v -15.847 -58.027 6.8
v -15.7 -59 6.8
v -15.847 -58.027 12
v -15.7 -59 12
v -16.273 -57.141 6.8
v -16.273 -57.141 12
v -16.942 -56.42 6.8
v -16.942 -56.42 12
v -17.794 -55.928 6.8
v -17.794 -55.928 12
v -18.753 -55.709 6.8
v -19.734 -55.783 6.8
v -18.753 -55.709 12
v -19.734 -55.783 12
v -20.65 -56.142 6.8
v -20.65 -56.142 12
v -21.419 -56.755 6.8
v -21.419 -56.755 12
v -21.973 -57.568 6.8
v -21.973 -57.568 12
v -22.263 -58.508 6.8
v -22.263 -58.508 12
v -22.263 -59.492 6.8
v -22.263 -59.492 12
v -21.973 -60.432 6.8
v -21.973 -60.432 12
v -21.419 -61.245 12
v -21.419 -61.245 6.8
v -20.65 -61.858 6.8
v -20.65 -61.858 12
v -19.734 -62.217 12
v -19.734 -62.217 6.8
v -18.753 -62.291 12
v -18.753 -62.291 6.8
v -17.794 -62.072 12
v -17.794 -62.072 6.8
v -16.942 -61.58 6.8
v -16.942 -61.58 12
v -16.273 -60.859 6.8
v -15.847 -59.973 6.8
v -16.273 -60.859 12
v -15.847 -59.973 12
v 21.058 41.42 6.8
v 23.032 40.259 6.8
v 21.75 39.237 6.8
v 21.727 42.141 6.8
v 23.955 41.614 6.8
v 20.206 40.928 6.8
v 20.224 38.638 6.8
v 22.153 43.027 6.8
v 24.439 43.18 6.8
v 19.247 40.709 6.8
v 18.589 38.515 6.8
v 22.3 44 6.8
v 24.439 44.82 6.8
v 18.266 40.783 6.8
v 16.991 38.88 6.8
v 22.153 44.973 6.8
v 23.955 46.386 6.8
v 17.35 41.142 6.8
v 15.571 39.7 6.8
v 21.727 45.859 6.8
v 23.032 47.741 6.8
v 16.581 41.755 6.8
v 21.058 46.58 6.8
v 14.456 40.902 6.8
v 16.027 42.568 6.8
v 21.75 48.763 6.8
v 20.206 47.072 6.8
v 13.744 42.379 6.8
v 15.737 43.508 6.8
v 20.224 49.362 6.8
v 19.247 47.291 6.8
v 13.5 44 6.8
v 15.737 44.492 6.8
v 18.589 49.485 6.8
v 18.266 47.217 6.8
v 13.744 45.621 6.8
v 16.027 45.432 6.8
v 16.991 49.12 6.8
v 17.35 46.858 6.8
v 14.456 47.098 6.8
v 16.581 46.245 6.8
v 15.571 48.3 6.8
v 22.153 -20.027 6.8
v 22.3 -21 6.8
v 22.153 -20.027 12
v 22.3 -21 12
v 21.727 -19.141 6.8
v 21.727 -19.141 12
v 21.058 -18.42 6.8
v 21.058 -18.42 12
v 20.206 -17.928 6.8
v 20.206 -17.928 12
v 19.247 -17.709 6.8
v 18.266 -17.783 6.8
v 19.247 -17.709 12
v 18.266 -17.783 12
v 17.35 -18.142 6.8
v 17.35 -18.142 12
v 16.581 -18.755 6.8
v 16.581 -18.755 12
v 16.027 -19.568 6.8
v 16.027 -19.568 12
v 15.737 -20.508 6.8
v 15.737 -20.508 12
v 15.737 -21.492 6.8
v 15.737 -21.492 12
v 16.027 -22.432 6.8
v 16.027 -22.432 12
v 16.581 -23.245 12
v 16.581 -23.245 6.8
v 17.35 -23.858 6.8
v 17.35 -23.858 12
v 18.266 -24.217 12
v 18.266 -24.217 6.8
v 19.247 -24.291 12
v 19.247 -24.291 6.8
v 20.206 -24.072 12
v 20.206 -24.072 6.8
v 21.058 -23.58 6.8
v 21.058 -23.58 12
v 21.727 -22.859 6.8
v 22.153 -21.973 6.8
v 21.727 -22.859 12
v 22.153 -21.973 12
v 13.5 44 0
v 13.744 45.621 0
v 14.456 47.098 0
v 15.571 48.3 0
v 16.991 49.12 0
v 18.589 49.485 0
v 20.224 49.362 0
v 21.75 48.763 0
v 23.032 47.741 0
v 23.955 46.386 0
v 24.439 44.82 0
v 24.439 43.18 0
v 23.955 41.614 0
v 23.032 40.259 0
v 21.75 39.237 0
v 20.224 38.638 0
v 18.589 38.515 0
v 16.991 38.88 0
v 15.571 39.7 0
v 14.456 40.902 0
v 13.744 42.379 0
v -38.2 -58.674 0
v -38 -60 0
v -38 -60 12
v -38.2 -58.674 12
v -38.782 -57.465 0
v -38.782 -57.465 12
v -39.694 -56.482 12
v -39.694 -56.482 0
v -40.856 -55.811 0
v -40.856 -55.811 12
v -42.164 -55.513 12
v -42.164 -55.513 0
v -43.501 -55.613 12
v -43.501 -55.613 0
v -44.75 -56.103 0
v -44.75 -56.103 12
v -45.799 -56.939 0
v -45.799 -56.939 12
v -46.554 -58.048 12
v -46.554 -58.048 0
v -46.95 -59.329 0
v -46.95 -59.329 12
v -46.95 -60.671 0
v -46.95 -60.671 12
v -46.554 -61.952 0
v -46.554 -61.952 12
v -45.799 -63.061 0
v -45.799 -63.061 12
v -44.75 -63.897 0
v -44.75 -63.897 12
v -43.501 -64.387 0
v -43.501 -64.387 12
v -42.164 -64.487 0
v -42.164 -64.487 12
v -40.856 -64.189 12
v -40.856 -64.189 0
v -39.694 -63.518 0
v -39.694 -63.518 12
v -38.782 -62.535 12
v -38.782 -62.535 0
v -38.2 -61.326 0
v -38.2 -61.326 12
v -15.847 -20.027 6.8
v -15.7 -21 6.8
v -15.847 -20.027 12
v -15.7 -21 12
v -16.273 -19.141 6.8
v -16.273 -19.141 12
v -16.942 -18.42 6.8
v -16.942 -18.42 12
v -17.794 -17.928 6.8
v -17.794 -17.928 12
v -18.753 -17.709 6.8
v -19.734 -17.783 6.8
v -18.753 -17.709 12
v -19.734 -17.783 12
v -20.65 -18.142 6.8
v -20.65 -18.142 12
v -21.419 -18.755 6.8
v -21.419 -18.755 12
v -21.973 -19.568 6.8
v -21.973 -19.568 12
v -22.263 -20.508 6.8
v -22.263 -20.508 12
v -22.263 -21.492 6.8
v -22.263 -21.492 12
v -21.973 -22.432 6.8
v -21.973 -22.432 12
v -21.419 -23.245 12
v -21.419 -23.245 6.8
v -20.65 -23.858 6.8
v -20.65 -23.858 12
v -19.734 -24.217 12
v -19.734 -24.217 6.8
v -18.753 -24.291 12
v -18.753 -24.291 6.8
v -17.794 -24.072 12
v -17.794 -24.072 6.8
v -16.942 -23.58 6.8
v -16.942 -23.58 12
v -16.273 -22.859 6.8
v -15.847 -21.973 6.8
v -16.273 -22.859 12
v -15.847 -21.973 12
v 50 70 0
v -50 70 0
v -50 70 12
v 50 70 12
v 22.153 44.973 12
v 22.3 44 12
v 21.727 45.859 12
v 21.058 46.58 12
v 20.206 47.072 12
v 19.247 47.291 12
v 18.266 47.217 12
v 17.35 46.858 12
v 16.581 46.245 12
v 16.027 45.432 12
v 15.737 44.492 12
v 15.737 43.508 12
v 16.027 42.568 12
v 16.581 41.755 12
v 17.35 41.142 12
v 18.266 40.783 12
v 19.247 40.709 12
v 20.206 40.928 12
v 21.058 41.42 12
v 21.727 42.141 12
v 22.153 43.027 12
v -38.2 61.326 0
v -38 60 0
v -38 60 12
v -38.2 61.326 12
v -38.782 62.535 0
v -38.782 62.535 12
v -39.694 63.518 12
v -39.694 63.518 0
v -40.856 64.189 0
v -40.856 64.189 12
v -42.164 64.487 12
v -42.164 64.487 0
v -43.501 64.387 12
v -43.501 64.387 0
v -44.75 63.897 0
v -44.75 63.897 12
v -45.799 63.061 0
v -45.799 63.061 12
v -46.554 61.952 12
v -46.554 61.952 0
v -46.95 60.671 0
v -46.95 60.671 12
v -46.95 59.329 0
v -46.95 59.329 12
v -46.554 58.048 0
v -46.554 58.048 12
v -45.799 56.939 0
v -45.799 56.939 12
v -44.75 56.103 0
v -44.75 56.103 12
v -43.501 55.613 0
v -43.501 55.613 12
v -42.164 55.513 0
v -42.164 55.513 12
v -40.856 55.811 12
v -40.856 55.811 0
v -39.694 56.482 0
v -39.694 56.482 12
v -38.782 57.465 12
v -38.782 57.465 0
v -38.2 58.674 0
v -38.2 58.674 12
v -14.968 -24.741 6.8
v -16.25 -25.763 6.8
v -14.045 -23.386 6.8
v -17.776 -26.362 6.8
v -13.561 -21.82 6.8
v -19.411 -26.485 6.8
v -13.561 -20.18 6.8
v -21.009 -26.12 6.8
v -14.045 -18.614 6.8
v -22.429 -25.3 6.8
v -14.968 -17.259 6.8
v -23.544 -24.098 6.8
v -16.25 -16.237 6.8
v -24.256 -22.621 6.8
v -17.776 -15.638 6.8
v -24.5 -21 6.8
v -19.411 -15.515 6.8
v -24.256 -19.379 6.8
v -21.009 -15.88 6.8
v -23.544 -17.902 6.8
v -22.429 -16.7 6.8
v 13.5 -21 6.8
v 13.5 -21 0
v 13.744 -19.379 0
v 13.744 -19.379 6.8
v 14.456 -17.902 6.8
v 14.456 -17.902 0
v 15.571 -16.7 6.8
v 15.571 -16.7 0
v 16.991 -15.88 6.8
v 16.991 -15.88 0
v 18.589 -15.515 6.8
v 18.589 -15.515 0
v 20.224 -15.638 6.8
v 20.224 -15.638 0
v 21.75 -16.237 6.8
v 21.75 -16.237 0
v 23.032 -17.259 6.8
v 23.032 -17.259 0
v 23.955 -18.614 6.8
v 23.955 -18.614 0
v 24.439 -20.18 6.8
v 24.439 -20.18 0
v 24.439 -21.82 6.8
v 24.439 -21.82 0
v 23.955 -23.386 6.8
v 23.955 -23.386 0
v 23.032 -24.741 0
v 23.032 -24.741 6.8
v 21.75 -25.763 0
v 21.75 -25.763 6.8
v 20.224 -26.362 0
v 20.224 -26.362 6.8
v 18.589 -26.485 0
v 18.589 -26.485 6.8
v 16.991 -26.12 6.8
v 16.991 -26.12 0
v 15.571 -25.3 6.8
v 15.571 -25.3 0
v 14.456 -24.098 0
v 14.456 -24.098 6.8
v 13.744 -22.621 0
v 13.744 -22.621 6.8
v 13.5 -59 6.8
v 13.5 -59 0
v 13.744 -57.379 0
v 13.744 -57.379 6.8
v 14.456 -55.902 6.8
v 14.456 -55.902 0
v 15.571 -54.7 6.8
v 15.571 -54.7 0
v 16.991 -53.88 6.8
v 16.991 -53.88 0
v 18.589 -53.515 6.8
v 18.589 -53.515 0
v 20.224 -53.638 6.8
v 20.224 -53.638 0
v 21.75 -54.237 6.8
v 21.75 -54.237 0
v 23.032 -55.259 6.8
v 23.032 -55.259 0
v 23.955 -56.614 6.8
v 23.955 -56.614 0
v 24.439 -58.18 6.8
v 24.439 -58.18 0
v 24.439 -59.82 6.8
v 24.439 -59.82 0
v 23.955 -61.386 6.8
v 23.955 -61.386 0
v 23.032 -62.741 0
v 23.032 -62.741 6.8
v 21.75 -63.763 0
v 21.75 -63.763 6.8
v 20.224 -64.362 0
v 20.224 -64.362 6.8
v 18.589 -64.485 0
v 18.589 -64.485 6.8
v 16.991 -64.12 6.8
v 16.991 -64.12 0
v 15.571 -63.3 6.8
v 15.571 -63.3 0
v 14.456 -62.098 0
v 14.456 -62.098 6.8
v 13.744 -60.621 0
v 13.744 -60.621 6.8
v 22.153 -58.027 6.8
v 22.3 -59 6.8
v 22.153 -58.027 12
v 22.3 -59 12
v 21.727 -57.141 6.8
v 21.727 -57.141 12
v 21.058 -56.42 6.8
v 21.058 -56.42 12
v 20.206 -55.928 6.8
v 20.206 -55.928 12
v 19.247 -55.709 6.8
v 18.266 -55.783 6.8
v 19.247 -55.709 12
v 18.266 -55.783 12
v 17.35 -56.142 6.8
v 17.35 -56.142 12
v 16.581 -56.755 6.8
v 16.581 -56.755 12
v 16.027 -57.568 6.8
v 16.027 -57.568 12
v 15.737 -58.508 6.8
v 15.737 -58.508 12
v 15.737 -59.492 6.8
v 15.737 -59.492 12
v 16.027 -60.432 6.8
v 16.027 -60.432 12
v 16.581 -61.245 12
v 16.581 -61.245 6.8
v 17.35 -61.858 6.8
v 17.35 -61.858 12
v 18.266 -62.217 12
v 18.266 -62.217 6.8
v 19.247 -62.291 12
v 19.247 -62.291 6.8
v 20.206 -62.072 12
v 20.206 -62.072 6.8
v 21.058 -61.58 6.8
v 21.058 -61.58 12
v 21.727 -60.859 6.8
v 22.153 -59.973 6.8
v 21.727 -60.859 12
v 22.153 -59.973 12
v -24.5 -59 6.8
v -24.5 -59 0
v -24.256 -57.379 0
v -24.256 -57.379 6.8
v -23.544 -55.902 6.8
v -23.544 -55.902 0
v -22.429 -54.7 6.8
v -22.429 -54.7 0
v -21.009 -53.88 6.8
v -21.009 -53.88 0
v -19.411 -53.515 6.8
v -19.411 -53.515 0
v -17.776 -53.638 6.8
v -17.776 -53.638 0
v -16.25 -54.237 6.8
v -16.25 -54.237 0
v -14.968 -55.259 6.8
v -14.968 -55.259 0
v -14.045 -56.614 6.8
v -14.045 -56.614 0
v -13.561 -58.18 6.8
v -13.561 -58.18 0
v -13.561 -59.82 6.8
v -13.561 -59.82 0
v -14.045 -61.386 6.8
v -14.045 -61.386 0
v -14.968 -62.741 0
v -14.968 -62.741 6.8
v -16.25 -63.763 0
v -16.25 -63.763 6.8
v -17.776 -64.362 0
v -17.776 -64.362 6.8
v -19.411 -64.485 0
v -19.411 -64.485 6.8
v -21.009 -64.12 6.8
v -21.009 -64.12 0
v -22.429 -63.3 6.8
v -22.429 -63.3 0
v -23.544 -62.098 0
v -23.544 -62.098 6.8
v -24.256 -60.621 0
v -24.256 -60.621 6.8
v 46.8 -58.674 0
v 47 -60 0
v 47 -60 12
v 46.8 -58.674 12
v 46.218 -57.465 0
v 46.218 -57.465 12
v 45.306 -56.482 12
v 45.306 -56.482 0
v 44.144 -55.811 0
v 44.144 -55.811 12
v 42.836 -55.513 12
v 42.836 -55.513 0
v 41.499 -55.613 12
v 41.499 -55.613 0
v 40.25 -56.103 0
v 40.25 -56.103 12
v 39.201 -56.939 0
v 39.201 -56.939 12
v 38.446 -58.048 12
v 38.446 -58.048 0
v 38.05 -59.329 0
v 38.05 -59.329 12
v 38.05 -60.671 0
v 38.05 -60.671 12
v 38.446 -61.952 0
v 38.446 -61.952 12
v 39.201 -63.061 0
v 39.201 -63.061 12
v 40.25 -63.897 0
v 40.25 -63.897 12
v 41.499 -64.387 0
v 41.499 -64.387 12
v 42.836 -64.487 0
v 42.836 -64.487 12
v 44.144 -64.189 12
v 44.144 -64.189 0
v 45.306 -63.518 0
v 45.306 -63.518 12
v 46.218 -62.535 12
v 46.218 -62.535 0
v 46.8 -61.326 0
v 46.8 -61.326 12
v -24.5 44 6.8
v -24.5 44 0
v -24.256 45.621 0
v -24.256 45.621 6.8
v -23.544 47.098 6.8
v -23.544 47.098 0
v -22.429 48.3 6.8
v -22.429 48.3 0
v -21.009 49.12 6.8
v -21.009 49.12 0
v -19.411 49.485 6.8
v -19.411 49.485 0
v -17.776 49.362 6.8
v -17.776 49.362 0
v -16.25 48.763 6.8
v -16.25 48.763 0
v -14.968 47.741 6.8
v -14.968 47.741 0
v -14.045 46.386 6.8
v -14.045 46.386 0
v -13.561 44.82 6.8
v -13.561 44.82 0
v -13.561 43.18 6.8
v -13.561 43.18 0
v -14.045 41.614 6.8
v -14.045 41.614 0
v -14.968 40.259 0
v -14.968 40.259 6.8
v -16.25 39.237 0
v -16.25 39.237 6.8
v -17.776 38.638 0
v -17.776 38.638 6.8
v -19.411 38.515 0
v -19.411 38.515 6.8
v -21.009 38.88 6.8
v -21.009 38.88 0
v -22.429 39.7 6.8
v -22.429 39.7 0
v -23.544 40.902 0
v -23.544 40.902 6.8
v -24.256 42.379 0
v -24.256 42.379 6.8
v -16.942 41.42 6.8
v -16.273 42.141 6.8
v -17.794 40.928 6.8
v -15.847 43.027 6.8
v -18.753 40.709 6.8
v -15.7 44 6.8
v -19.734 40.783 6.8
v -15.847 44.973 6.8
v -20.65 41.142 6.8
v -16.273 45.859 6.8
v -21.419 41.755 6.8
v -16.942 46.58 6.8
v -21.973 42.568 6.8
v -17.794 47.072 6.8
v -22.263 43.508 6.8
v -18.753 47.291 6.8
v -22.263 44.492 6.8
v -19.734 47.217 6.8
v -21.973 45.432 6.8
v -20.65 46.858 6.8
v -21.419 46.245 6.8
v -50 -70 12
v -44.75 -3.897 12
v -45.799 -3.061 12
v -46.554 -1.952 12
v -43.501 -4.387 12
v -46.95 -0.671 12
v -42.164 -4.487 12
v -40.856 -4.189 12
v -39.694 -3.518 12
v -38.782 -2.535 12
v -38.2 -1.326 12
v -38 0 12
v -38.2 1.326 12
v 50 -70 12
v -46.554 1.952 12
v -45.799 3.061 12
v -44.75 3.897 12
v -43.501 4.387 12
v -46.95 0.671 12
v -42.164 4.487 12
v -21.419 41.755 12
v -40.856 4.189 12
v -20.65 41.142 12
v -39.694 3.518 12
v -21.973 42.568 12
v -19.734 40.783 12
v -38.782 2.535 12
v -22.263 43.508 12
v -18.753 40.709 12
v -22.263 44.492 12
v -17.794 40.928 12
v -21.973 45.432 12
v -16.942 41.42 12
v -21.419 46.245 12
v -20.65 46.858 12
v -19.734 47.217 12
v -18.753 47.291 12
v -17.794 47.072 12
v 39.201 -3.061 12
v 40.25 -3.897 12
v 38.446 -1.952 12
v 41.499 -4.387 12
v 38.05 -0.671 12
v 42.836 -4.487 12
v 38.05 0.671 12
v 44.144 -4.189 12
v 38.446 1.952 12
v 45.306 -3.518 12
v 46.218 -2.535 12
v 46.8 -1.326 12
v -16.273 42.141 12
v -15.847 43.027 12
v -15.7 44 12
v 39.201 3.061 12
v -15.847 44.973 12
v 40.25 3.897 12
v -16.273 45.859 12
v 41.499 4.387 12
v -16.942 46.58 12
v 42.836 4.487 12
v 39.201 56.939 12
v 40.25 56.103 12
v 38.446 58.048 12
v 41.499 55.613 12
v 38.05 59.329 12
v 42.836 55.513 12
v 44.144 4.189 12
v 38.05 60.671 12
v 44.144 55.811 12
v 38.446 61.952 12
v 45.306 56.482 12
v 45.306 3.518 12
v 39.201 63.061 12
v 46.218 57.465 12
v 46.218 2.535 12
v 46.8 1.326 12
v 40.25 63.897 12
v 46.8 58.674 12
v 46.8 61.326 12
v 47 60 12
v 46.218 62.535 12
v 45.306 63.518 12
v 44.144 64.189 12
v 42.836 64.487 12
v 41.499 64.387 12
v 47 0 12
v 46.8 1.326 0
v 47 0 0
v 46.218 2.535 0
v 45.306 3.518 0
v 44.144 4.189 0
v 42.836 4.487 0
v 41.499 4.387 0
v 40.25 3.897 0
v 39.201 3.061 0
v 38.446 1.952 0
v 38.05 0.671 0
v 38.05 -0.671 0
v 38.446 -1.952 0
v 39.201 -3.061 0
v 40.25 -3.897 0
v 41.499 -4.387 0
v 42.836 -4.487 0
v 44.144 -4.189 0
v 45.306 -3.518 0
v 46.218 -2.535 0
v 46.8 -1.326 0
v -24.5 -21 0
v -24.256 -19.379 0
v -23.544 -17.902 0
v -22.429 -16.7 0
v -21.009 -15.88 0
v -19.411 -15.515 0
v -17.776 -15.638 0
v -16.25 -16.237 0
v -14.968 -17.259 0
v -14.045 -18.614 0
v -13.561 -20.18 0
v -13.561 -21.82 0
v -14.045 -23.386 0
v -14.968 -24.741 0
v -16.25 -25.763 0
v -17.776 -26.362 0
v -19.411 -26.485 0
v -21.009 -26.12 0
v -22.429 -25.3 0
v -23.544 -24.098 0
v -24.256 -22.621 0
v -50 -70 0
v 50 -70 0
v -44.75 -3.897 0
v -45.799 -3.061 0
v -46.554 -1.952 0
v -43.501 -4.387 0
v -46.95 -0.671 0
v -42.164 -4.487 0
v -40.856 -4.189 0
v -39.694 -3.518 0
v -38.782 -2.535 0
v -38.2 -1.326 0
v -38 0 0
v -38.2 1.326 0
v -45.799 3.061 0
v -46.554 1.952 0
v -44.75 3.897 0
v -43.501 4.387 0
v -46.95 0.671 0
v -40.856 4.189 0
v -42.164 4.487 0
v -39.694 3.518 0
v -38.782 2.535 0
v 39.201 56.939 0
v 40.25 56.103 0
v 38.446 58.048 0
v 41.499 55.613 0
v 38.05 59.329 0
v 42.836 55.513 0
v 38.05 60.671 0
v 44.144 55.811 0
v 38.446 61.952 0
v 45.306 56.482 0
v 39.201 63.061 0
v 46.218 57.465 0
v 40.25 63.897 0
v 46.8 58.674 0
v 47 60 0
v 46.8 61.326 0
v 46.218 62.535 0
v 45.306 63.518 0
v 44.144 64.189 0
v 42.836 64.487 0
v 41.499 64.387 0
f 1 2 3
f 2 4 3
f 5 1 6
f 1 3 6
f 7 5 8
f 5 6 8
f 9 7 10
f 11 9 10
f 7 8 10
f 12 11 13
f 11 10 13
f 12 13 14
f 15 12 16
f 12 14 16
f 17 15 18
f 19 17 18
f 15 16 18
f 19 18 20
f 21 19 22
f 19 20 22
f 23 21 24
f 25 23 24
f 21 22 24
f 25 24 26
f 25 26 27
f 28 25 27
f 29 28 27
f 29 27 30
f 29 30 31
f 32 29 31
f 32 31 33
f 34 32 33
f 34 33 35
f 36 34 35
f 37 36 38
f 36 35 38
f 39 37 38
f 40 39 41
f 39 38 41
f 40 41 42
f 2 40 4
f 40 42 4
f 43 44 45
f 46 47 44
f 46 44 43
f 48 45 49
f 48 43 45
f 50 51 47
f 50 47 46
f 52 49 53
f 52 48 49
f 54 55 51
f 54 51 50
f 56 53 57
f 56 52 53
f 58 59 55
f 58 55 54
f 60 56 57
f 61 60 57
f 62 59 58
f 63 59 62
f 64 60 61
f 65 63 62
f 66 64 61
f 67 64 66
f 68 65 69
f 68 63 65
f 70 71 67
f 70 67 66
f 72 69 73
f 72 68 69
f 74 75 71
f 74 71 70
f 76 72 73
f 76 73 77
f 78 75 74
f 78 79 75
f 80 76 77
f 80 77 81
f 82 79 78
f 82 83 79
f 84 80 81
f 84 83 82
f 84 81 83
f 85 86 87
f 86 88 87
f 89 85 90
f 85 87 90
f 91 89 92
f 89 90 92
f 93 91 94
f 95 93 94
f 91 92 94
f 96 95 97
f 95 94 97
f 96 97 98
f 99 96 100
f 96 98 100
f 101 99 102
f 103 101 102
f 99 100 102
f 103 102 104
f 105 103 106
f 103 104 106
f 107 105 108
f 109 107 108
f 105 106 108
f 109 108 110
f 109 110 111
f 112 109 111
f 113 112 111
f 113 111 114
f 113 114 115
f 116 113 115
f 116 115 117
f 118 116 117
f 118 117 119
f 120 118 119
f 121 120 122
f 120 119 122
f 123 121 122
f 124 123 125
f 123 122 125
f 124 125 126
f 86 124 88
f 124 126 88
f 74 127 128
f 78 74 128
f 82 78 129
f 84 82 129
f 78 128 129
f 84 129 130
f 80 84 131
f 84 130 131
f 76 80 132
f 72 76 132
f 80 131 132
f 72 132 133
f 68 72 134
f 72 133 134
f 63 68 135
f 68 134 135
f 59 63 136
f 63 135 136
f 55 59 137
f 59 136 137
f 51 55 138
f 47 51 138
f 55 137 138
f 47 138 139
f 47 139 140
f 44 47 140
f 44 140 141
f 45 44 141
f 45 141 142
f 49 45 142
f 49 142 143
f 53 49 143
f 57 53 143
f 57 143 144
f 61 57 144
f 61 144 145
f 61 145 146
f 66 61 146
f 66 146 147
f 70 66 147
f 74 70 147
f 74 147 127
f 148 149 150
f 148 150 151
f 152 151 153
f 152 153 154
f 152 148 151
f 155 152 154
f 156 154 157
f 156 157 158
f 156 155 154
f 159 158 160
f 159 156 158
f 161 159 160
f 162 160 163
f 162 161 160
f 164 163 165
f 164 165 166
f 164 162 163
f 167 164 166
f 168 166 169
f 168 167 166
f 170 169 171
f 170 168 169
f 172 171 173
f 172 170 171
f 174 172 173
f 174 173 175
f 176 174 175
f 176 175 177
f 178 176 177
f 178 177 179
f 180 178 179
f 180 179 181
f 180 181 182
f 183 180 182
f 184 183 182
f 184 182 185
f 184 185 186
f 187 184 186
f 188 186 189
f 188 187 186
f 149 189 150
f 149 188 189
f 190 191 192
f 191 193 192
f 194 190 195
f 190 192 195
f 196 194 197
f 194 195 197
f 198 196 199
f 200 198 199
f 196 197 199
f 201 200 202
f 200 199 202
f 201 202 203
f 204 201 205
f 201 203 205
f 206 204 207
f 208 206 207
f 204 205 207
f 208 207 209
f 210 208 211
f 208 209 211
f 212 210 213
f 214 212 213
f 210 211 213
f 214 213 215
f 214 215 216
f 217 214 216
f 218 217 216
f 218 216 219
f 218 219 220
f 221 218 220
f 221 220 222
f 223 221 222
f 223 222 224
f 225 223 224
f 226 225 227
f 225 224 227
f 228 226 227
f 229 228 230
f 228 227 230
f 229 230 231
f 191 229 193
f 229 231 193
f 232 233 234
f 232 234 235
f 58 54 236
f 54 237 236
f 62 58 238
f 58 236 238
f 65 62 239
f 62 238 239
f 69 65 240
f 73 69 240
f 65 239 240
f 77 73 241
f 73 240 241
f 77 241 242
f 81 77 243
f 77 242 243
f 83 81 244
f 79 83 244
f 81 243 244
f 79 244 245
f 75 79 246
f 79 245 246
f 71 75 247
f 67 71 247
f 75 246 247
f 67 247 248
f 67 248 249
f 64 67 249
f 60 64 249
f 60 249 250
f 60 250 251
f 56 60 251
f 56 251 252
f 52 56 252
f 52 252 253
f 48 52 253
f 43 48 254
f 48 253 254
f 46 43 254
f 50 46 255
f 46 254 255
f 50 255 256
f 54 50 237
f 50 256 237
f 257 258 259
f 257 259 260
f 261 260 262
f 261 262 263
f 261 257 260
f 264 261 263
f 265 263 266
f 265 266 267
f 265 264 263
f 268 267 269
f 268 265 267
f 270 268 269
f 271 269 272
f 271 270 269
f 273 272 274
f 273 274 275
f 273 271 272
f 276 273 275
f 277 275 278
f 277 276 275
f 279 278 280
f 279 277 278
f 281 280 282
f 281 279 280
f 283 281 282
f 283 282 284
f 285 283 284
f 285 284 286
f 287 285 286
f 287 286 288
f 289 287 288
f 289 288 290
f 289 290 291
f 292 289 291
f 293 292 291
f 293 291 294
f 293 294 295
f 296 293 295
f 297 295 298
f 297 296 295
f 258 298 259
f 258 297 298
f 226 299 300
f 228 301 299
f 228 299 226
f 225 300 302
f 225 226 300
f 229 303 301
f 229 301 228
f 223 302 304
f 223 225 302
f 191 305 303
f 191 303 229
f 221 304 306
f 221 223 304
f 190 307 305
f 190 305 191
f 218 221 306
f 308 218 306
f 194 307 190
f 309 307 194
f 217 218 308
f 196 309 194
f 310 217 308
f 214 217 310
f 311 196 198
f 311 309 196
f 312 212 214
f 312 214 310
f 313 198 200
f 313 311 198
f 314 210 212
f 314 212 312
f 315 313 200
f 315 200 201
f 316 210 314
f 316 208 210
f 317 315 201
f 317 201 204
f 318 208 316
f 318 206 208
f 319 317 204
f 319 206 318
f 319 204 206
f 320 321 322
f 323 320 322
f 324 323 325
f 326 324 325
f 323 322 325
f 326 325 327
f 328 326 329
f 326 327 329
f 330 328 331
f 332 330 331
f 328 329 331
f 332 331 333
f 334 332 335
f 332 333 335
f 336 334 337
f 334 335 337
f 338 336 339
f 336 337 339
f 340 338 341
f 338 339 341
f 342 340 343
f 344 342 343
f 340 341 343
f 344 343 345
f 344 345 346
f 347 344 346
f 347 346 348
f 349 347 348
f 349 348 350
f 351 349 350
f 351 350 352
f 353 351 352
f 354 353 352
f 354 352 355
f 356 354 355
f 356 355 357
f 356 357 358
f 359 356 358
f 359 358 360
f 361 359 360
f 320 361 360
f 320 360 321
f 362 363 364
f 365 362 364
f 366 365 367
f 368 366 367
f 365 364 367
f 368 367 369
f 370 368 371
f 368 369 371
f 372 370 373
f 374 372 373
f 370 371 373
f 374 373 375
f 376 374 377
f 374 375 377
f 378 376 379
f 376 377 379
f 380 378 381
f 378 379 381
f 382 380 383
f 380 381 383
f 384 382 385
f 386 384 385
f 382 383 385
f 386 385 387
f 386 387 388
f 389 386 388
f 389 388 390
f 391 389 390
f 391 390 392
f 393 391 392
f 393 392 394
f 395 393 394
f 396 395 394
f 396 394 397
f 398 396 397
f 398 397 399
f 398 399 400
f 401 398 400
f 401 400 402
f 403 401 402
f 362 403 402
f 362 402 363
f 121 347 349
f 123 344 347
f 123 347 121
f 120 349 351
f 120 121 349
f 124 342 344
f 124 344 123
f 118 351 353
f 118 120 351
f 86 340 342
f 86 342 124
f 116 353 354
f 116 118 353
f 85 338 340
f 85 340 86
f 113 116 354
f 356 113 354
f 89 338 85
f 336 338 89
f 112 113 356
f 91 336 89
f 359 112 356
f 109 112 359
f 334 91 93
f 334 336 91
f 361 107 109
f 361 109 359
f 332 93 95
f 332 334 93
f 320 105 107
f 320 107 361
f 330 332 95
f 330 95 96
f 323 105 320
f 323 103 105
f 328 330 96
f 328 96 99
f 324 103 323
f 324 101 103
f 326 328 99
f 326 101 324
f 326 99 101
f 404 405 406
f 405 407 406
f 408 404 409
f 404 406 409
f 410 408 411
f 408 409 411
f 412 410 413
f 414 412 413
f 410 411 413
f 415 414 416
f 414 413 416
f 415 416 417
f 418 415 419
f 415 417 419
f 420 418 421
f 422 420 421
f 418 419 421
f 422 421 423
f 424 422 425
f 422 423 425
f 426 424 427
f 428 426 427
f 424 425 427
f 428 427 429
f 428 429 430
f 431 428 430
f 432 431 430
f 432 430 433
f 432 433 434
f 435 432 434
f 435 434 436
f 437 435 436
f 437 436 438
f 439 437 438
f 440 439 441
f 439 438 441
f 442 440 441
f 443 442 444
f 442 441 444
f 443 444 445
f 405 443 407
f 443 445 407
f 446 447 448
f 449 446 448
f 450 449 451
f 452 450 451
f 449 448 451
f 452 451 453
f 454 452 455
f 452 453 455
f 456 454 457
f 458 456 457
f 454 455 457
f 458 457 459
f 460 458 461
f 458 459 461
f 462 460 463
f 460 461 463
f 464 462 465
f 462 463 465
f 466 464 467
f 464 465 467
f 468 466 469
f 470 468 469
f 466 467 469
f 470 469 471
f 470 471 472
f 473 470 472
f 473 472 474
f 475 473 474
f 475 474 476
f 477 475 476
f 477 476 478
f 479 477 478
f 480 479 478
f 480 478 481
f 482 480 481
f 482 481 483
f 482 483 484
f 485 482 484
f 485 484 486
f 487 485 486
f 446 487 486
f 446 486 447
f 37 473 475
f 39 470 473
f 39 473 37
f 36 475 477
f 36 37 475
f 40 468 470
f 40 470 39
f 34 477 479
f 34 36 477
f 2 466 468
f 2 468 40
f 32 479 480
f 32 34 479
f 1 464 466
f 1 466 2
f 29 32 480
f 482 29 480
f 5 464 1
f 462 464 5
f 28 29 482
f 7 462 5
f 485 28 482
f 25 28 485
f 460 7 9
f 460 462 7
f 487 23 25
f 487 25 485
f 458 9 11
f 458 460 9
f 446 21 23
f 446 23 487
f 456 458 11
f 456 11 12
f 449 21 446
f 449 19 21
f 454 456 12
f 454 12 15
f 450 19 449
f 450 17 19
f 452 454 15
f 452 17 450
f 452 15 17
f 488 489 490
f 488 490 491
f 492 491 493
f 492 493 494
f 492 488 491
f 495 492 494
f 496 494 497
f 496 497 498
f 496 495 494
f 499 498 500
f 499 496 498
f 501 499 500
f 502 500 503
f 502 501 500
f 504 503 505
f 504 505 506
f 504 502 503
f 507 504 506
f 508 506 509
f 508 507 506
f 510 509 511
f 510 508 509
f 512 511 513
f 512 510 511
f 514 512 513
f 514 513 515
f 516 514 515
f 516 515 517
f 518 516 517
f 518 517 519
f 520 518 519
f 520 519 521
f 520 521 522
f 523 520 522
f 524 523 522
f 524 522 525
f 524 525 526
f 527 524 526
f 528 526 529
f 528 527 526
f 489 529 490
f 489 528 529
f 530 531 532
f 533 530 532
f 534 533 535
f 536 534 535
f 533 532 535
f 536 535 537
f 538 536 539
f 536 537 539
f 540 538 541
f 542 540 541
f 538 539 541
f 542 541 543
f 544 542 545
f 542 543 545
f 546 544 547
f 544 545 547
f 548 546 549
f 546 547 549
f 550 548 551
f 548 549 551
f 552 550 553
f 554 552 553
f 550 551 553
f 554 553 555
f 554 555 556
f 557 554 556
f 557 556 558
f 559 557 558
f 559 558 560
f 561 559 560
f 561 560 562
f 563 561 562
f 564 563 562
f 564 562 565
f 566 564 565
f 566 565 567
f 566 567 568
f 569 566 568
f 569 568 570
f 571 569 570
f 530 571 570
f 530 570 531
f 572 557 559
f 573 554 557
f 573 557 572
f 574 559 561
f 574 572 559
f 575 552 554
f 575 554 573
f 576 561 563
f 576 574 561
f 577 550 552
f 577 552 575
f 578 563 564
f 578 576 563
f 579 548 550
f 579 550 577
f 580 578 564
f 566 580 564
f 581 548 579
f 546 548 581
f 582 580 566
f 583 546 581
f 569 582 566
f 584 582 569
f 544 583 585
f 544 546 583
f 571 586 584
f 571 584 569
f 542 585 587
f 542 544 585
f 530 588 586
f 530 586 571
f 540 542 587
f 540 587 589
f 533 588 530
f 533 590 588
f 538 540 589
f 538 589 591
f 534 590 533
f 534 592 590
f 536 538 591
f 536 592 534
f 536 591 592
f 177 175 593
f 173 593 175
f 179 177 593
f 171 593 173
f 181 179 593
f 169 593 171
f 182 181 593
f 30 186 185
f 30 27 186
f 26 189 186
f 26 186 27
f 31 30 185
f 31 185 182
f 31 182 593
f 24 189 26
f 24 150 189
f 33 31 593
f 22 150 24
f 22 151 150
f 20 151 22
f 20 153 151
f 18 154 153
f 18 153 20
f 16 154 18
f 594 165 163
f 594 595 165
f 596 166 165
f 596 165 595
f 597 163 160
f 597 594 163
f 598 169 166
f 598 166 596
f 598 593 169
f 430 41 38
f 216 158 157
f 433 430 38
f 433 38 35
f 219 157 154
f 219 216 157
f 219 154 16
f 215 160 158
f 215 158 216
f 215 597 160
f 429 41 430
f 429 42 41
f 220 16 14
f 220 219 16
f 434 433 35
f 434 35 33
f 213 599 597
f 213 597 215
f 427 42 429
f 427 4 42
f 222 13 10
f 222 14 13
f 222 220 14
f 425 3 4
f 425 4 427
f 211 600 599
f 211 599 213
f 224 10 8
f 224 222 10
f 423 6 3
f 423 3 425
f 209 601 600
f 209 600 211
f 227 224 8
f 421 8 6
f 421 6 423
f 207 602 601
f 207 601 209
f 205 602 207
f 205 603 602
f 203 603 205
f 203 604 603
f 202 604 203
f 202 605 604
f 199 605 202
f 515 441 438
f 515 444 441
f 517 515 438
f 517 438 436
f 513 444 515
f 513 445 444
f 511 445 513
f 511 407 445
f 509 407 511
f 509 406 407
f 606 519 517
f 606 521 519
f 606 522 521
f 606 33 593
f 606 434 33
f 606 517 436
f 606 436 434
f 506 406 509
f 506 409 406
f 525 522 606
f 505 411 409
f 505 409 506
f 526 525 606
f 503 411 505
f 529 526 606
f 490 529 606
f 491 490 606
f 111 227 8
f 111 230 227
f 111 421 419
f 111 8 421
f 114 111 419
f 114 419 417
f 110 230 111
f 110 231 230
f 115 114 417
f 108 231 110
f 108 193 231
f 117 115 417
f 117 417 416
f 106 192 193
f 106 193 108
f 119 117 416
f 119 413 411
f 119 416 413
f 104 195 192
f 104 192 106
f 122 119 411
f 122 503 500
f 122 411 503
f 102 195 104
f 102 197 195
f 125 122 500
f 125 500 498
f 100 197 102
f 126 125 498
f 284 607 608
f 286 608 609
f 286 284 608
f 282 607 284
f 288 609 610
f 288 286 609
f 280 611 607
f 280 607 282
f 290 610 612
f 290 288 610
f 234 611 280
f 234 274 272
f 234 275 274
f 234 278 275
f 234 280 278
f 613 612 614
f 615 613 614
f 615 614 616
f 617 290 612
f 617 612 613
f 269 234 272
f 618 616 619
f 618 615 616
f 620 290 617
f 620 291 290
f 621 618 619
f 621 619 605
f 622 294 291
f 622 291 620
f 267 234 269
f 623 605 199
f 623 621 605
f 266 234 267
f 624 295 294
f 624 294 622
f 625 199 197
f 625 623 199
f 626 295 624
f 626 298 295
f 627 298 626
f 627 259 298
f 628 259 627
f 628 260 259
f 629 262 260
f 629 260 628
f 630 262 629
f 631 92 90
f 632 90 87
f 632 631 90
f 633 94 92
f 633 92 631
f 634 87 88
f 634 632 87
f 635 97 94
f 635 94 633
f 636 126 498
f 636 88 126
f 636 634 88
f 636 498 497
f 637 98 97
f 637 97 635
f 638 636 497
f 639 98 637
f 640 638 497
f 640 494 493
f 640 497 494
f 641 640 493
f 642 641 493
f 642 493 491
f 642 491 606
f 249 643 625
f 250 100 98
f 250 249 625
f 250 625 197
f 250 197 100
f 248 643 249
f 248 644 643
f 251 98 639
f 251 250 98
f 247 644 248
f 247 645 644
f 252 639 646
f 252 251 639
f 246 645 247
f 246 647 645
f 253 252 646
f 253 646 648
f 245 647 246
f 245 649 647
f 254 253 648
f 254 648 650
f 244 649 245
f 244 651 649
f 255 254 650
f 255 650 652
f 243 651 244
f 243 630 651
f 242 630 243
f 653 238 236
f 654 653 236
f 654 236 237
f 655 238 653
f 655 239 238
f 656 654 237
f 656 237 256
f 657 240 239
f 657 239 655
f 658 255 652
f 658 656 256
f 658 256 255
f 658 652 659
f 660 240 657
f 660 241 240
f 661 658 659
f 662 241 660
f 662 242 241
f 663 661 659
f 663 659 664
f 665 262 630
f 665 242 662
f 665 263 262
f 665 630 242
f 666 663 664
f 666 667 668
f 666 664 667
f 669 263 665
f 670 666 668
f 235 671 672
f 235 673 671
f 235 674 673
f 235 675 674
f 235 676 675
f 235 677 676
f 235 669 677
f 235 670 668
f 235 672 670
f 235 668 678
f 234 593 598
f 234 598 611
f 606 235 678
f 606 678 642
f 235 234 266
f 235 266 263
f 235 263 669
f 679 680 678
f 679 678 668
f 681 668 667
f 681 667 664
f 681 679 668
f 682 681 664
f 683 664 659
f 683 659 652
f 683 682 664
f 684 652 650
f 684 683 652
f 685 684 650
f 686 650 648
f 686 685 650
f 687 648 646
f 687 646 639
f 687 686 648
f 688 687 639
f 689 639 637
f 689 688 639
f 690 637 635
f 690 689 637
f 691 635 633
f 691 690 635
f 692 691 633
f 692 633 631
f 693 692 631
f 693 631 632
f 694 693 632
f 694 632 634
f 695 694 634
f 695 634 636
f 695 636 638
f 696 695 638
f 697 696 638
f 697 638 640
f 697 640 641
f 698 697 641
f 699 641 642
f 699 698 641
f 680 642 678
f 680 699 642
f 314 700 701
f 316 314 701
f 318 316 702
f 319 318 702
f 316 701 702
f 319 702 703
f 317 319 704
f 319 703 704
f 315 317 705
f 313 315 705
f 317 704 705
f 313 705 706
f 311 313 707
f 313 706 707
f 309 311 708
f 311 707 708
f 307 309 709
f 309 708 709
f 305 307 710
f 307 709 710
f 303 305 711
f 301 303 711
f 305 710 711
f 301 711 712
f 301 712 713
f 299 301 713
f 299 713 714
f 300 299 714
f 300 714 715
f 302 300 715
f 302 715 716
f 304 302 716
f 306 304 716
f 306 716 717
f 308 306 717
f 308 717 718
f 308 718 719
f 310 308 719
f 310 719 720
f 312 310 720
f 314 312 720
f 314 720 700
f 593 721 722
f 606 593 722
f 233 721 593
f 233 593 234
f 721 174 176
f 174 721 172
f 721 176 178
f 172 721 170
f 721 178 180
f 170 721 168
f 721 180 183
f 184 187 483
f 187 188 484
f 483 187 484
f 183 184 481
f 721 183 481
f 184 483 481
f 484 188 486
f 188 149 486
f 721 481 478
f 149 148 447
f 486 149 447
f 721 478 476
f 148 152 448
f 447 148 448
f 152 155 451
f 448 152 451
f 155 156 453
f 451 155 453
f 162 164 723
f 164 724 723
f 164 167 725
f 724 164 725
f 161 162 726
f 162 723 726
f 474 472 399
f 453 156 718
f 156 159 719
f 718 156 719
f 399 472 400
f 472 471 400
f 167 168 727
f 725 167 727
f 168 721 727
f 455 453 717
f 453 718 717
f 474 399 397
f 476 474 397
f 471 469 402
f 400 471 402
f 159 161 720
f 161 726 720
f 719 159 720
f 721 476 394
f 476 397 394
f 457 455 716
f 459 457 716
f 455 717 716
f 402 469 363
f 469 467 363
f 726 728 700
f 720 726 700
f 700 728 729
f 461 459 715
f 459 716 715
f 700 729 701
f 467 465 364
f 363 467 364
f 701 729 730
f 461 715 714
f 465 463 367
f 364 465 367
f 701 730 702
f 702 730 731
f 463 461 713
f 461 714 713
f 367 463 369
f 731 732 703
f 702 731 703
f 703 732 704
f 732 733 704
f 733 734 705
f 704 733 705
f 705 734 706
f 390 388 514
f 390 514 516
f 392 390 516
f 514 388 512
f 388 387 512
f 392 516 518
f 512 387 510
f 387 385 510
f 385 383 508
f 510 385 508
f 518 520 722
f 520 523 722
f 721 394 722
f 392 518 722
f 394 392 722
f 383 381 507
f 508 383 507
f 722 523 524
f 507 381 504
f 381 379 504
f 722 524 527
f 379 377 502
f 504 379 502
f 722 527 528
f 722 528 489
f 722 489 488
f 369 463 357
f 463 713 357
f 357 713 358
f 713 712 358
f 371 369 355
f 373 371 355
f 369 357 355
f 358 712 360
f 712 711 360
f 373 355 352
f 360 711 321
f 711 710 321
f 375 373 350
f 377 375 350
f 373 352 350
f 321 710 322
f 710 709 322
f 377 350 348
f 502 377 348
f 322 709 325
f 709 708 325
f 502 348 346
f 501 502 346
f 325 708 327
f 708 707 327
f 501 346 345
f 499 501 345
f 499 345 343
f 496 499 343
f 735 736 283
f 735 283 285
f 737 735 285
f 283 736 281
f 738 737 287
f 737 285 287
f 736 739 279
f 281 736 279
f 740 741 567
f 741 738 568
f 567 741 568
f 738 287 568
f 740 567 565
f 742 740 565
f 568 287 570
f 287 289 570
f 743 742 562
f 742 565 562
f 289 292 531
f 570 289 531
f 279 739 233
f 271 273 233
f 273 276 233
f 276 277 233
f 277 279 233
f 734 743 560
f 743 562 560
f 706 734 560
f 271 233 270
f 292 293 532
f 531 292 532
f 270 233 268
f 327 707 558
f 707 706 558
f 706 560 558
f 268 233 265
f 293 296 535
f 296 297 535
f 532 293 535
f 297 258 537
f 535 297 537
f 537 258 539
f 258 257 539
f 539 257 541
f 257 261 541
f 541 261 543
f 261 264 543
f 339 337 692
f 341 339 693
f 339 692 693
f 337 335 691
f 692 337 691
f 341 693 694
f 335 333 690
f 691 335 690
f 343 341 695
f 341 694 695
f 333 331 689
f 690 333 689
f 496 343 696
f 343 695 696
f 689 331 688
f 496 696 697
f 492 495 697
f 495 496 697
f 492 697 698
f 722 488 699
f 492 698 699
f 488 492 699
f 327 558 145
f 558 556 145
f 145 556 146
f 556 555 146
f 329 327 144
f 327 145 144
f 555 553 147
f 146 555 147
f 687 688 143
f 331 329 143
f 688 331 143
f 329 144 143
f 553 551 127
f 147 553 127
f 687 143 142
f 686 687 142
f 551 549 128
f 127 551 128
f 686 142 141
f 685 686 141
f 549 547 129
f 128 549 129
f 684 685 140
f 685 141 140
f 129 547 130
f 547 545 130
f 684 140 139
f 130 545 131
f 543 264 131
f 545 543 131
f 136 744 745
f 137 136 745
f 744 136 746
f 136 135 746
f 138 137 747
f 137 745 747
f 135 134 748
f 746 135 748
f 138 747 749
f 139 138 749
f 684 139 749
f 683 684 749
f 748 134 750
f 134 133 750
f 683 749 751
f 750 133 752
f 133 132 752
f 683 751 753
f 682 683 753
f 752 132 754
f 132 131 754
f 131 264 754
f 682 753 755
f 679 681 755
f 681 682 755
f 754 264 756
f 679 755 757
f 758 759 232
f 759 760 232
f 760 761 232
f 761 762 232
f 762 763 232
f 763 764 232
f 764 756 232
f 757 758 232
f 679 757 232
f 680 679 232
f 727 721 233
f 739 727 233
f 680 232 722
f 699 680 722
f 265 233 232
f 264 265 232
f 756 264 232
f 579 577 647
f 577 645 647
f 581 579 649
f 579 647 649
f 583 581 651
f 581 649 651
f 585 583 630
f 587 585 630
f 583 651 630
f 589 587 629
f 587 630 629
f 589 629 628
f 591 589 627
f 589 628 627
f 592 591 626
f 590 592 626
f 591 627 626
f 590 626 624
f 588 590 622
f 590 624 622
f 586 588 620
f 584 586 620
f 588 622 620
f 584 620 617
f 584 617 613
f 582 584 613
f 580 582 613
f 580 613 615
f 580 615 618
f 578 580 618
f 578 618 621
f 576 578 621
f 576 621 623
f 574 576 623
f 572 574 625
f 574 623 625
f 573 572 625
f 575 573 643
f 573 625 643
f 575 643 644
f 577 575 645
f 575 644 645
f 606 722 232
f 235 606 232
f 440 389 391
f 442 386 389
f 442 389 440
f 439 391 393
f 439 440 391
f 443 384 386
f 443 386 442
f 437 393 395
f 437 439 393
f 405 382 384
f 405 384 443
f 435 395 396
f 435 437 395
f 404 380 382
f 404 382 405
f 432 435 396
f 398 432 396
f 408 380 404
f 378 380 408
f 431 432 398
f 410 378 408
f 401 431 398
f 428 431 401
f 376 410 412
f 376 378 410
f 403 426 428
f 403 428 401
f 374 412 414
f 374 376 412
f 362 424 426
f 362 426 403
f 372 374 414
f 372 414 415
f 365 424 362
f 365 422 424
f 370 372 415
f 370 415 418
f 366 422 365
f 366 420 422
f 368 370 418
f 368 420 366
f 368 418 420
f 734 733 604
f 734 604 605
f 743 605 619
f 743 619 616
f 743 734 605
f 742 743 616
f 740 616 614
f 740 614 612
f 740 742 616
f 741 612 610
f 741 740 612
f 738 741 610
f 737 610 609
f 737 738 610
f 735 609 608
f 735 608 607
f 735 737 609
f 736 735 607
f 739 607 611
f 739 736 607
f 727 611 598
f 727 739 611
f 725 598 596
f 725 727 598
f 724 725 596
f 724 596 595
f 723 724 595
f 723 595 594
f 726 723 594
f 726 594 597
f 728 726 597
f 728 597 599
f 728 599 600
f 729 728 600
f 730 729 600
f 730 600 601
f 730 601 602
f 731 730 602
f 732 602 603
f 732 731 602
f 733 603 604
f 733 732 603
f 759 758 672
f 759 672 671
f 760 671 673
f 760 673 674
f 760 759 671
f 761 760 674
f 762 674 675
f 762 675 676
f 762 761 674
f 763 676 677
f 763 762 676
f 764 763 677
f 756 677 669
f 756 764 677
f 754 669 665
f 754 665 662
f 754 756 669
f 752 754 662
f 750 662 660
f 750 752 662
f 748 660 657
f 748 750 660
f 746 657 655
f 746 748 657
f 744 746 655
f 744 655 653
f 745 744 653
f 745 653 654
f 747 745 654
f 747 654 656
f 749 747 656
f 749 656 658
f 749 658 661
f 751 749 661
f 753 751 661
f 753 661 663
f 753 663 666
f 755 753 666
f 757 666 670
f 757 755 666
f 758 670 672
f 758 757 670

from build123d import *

# Parameters (mm, degrees)
SKETCH_1_W                  = 100
SKETCH_1_H                  = 140
SKETCH_1_R                  = 4.5
EXTRUDE_1_DEPTH             = 12
HOLE_WIZARD_1_D             = 6.6
HOLE_WIZARD_1_CBORE_D       = 11
HOLE_WIZARD_1_CBORE_DEPTH   = 6.8
PATTERN_LINEAR_1_COUNT      = 2
PATTERN_LINEAR_1_PITCH      = 38
PATTERN_LINEAR_1_COUNT_DIR2 = 2
PATTERN_LINEAR_1_PITCH_DIR2 = 38
HOLE_WIZARD_0_D             = 6.6
HOLE_WIZARD_0_CBORE_D       = 11
HOLE_WIZARD_0_CBORE_DEPTH   = 6.8
PATTERN_LINEAR_2_COUNT      = 2
PATTERN_LINEAR_2_PITCH      = 38


with BuildPart() as part:
    # 草图1 → 凸台-拉伸1 (new body)
    with BuildSketch(Plane.XY):
        Rectangle(SKETCH_1_W, SKETCH_1_H)
        with Locations((-42.5, -60)):
            Circle(SKETCH_1_R, mode=Mode.SUBTRACT)
        with Locations((42.5, -60)):
            Circle(SKETCH_1_R, mode=Mode.SUBTRACT)
        with Locations((42.5, 0)):
            Circle(SKETCH_1_R, mode=Mode.SUBTRACT)
        with Locations((42.5, 60)):
            Circle(SKETCH_1_R, mode=Mode.SUBTRACT)
        with Locations((-42.5, 0)):
            Circle(SKETCH_1_R, mode=Mode.SUBTRACT)
        with Locations((-42.5, 60)):
            Circle(SKETCH_1_R, mode=Mode.SUBTRACT)
    extrude(amount=EXTRUDE_1_DEPTH)

    # 打孔尺寸(%根据)内六角圆柱头螺钉的类型1 (through all)
    with Locations(Plane(origin=(0, 0, 0), x_dir=(-1, 0, 0), z_dir=(0, 0, -1))):
        with Locations((-19, -59)):
            hole_wizard_1 = CounterBoreHole(HOLE_WIZARD_1_D / 2, HOLE_WIZARD_1_CBORE_D / 2, HOLE_WIZARD_1_CBORE_DEPTH)

    # 阵列(线性)1: Hole Wizard 1 2 × 2
    with Locations(*[(-j * PATTERN_LINEAR_1_PITCH_DIR2, i * PATTERN_LINEAR_1_PITCH, 0) for i in range(PATTERN_LINEAR_1_COUNT) for j in range(PATTERN_LINEAR_1_COUNT_DIR2) if (i, j) != (0, 0)]):
        add(hole_wizard_1, mode=Mode.SUBTRACT)

    # 打孔尺寸(%根据)内六角圆柱头螺钉的类型0 (through all)
    with Locations(Plane(origin=(0, 0, 0), x_dir=(-1, 0, 0), z_dir=(0, 0, -1))):
        with Locations((-19, 44)):
            hole_wizard_0 = CounterBoreHole(HOLE_WIZARD_0_D / 2, HOLE_WIZARD_0_CBORE_D / 2, HOLE_WIZARD_0_CBORE_DEPTH)

    # 阵列(线性)2: 打孔尺寸(%根据)内六角圆柱头螺钉的类型0 ×2
    with Locations(*[(-i * PATTERN_LINEAR_2_PITCH, 0, 0) for i in range(1, PATTERN_LINEAR_2_COUNT)]):
        add(hole_wizard_0, mode=Mode.SUBTRACT)


solid = part.part
